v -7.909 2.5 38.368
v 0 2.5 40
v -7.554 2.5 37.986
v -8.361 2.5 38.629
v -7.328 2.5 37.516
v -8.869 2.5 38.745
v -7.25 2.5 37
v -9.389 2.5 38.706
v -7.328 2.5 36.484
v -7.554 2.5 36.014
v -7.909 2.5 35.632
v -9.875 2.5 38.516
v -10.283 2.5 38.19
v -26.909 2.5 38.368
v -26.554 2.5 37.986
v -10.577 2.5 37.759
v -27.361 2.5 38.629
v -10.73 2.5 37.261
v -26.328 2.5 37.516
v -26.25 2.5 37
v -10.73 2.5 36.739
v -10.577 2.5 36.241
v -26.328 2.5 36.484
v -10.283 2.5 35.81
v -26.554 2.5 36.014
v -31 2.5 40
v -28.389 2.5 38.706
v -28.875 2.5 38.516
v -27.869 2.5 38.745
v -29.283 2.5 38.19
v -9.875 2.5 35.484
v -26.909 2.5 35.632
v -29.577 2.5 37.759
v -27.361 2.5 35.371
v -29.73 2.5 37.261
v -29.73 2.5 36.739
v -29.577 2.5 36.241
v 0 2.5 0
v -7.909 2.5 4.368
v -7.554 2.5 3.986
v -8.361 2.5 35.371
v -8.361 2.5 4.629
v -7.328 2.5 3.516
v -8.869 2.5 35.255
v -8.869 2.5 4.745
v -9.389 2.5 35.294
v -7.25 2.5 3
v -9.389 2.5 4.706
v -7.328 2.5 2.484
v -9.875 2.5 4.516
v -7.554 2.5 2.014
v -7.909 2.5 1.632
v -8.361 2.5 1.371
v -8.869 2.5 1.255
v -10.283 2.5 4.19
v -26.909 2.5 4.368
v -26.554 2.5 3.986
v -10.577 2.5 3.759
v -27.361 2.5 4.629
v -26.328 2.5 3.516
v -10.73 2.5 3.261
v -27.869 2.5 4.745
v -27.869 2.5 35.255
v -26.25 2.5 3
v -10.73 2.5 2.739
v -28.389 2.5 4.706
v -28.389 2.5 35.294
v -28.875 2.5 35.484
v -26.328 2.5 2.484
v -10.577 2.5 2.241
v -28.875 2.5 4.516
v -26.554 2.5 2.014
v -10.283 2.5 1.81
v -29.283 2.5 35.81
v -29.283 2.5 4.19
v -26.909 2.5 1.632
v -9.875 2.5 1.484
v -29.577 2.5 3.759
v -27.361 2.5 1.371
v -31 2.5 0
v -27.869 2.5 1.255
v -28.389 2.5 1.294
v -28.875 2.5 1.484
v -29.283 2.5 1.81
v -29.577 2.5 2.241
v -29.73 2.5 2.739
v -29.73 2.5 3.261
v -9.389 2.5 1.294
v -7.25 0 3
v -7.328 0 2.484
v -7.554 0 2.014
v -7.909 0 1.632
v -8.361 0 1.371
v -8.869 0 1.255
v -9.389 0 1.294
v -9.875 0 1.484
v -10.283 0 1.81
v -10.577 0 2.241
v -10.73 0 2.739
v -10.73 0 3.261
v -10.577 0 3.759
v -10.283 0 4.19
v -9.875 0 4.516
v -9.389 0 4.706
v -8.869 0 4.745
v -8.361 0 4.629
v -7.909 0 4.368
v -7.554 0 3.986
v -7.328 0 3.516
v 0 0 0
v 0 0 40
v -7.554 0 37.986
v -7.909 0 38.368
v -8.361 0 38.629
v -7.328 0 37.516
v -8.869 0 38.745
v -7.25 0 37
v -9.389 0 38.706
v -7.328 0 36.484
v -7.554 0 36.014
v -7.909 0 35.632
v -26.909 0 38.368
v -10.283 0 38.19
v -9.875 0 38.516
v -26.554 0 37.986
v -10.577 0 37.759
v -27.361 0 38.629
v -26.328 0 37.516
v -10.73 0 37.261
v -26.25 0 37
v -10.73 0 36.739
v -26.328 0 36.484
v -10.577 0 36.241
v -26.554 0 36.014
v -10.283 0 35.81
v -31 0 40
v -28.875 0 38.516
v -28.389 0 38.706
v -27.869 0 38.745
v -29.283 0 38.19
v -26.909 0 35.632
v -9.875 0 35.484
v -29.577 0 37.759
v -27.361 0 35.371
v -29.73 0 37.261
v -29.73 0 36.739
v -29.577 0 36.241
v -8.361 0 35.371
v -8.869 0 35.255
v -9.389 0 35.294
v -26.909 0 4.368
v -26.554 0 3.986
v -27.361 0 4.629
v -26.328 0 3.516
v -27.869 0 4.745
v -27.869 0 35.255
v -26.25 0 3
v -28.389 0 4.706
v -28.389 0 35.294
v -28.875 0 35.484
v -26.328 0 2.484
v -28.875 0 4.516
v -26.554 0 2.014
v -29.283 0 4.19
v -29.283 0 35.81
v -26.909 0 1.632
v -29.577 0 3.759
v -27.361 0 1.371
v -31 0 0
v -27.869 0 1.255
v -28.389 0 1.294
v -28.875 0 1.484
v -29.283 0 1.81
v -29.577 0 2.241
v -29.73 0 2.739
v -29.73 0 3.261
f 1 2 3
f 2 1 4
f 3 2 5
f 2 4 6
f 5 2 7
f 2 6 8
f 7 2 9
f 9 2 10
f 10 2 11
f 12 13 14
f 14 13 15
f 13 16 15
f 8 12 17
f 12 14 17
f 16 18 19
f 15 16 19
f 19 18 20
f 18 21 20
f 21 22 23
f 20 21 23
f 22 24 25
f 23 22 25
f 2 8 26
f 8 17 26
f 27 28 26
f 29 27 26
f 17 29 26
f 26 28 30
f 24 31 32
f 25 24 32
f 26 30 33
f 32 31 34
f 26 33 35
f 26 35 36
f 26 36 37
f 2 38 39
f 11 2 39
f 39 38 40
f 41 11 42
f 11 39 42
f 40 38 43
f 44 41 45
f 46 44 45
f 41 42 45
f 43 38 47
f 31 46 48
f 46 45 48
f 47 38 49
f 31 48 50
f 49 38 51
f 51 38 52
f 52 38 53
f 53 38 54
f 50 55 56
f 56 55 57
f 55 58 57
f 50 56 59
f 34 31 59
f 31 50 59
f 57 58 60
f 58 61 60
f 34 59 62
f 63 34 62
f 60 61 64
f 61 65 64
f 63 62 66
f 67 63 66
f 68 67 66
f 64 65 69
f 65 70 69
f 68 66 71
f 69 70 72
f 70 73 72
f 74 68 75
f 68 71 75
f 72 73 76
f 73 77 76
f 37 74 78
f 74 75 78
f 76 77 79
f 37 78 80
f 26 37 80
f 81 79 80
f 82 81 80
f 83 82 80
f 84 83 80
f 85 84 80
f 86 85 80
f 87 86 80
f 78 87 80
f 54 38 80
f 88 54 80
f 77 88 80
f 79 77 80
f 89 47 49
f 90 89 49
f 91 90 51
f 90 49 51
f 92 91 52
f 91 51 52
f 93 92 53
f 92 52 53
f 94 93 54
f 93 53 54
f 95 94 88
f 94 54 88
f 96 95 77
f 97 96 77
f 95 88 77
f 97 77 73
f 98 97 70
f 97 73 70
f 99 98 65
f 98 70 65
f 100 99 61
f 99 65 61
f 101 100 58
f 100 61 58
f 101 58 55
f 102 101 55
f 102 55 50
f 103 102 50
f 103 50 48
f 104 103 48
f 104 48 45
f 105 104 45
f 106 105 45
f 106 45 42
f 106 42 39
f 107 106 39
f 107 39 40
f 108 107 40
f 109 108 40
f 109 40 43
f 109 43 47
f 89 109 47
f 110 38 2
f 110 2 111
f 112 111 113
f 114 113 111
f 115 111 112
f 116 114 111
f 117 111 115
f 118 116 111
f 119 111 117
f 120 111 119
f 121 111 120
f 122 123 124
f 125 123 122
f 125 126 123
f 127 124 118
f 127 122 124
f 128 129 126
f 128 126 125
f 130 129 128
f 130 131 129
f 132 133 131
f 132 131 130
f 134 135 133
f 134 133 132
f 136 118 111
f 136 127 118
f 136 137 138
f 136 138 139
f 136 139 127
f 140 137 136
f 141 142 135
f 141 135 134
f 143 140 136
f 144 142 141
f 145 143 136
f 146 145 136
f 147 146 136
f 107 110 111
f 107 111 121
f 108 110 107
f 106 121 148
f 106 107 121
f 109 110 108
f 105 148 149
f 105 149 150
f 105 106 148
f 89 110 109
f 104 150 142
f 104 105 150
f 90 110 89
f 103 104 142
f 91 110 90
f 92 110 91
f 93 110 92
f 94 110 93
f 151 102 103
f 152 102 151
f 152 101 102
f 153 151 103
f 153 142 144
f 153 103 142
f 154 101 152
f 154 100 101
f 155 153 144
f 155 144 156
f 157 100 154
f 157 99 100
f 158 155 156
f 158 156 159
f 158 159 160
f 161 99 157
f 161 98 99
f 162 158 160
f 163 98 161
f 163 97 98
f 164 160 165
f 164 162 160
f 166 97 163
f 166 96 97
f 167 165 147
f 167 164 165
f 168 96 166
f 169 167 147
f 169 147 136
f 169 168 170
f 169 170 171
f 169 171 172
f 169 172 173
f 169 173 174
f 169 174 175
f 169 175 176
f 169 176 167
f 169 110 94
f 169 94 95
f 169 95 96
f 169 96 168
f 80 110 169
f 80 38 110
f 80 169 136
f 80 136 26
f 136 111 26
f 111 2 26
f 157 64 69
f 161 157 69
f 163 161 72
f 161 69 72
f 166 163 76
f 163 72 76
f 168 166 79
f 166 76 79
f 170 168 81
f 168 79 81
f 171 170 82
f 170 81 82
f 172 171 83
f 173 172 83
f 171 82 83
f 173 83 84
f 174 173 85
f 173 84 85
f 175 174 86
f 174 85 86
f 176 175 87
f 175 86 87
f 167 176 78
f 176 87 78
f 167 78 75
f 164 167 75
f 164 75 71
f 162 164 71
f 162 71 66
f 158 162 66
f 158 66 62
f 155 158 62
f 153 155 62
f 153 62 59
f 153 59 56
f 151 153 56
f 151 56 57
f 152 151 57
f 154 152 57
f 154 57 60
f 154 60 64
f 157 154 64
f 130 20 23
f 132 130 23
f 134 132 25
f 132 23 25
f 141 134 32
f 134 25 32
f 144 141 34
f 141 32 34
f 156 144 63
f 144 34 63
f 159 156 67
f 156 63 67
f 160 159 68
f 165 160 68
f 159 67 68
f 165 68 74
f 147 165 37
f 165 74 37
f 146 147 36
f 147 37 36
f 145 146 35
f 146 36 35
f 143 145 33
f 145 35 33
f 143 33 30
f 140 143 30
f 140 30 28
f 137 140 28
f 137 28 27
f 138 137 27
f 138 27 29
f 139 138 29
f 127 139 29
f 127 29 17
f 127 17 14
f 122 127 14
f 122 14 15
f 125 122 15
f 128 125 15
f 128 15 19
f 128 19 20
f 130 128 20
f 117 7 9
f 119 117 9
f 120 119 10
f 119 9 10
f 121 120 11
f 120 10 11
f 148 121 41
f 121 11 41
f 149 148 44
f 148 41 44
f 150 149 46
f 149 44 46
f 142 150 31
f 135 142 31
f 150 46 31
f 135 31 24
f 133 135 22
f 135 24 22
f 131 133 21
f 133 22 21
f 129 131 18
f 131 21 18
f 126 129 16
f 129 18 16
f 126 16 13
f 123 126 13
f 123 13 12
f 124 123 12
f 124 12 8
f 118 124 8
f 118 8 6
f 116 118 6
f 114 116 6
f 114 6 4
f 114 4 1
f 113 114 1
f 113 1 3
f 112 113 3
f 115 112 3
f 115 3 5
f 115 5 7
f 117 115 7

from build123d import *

# Parameters (mm, degrees)
BOSS_EXTRUDE1_DEPTH = 40
CUT_EXTRUDE2_REACH  = 4.5
SKETCH3_R           = 1.75


with BuildPart() as part:
    # Sketch1 → Boss-Extrude1 (new body)
    with BuildSketch(Plane.XY):
        Polygon((0, 0), (-31, 0), (-31, 2.5), (-6, 2.5), (0, 2.5), align=None)
    extrude(amount=BOSS_EXTRUDE1_DEPTH)

    # Sketch3 → Cut-Extrude2 (cut, up to next)
    with BuildSketch(Plane(origin=(0, 2.5, 0), x_dir=(1, 0, 0), z_dir=(0, 1, 0)), mode=Mode.PRIVATE) as cut_extrude2_sk1:
        with Locations((-9, -3)):
            Circle(SKETCH3_R)
    cut_extrude2_tool1 = extrude(cut_extrude2_sk1.sketch, amount=-CUT_EXTRUDE2_REACH, mode=Mode.PRIVATE) & part.part
    add(cut_extrude2_tool1.solids().sort_by_distance((-9, 2.5, 3))[0], mode=Mode.SUBTRACT)
    # Sketch3 → Cut-Extrude2 (cut, up to next)
    with BuildSketch(Plane(origin=(0, 2.5, 0), x_dir=(1, 0, 0), z_dir=(0, 1, 0)), mode=Mode.PRIVATE) as cut_extrude2_sk2:
        with Locations((-28, -3)):
            Circle(SKETCH3_R)
    cut_extrude2_tool2 = extrude(cut_extrude2_sk2.sketch, amount=-CUT_EXTRUDE2_REACH, mode=Mode.PRIVATE) & part.part
    add(cut_extrude2_tool2.solids().sort_by_distance((-28, 2.5, 3))[0], mode=Mode.SUBTRACT)
    # Sketch3 → Cut-Extrude2 (cut, up to next)
    with BuildSketch(Plane(origin=(0, 2.5, 0), x_dir=(1, 0, 0), z_dir=(0, 1, 0)), mode=Mode.PRIVATE) as cut_extrude2_sk3:
        with Locations((-28, -37)):
            Circle(SKETCH3_R)
    cut_extrude2_tool3 = extrude(cut_extrude2_sk3.sketch, amount=-CUT_EXTRUDE2_REACH, mode=Mode.PRIVATE) & part.part
    add(cut_extrude2_tool3.solids().sort_by_distance((-28, 2.5, 37))[0], mode=Mode.SUBTRACT)
    # Sketch3 → Cut-Extrude2 (cut, up to next)
    with BuildSketch(Plane(origin=(0, 2.5, 0), x_dir=(1, 0, 0), z_dir=(0, 1, 0)), mode=Mode.PRIVATE) as cut_extrude2_sk4:
        with Locations((-9, -37)):
            Circle(SKETCH3_R)
    cut_extrude2_tool4 = extrude(cut_extrude2_sk4.sketch, amount=-CUT_EXTRUDE2_REACH, mode=Mode.PRIVATE) & part.part
    add(cut_extrude2_tool4.solids().sort_by_distance((-9, 2.5, 37))[0], mode=Mode.SUBTRACT)


solid = part.part
